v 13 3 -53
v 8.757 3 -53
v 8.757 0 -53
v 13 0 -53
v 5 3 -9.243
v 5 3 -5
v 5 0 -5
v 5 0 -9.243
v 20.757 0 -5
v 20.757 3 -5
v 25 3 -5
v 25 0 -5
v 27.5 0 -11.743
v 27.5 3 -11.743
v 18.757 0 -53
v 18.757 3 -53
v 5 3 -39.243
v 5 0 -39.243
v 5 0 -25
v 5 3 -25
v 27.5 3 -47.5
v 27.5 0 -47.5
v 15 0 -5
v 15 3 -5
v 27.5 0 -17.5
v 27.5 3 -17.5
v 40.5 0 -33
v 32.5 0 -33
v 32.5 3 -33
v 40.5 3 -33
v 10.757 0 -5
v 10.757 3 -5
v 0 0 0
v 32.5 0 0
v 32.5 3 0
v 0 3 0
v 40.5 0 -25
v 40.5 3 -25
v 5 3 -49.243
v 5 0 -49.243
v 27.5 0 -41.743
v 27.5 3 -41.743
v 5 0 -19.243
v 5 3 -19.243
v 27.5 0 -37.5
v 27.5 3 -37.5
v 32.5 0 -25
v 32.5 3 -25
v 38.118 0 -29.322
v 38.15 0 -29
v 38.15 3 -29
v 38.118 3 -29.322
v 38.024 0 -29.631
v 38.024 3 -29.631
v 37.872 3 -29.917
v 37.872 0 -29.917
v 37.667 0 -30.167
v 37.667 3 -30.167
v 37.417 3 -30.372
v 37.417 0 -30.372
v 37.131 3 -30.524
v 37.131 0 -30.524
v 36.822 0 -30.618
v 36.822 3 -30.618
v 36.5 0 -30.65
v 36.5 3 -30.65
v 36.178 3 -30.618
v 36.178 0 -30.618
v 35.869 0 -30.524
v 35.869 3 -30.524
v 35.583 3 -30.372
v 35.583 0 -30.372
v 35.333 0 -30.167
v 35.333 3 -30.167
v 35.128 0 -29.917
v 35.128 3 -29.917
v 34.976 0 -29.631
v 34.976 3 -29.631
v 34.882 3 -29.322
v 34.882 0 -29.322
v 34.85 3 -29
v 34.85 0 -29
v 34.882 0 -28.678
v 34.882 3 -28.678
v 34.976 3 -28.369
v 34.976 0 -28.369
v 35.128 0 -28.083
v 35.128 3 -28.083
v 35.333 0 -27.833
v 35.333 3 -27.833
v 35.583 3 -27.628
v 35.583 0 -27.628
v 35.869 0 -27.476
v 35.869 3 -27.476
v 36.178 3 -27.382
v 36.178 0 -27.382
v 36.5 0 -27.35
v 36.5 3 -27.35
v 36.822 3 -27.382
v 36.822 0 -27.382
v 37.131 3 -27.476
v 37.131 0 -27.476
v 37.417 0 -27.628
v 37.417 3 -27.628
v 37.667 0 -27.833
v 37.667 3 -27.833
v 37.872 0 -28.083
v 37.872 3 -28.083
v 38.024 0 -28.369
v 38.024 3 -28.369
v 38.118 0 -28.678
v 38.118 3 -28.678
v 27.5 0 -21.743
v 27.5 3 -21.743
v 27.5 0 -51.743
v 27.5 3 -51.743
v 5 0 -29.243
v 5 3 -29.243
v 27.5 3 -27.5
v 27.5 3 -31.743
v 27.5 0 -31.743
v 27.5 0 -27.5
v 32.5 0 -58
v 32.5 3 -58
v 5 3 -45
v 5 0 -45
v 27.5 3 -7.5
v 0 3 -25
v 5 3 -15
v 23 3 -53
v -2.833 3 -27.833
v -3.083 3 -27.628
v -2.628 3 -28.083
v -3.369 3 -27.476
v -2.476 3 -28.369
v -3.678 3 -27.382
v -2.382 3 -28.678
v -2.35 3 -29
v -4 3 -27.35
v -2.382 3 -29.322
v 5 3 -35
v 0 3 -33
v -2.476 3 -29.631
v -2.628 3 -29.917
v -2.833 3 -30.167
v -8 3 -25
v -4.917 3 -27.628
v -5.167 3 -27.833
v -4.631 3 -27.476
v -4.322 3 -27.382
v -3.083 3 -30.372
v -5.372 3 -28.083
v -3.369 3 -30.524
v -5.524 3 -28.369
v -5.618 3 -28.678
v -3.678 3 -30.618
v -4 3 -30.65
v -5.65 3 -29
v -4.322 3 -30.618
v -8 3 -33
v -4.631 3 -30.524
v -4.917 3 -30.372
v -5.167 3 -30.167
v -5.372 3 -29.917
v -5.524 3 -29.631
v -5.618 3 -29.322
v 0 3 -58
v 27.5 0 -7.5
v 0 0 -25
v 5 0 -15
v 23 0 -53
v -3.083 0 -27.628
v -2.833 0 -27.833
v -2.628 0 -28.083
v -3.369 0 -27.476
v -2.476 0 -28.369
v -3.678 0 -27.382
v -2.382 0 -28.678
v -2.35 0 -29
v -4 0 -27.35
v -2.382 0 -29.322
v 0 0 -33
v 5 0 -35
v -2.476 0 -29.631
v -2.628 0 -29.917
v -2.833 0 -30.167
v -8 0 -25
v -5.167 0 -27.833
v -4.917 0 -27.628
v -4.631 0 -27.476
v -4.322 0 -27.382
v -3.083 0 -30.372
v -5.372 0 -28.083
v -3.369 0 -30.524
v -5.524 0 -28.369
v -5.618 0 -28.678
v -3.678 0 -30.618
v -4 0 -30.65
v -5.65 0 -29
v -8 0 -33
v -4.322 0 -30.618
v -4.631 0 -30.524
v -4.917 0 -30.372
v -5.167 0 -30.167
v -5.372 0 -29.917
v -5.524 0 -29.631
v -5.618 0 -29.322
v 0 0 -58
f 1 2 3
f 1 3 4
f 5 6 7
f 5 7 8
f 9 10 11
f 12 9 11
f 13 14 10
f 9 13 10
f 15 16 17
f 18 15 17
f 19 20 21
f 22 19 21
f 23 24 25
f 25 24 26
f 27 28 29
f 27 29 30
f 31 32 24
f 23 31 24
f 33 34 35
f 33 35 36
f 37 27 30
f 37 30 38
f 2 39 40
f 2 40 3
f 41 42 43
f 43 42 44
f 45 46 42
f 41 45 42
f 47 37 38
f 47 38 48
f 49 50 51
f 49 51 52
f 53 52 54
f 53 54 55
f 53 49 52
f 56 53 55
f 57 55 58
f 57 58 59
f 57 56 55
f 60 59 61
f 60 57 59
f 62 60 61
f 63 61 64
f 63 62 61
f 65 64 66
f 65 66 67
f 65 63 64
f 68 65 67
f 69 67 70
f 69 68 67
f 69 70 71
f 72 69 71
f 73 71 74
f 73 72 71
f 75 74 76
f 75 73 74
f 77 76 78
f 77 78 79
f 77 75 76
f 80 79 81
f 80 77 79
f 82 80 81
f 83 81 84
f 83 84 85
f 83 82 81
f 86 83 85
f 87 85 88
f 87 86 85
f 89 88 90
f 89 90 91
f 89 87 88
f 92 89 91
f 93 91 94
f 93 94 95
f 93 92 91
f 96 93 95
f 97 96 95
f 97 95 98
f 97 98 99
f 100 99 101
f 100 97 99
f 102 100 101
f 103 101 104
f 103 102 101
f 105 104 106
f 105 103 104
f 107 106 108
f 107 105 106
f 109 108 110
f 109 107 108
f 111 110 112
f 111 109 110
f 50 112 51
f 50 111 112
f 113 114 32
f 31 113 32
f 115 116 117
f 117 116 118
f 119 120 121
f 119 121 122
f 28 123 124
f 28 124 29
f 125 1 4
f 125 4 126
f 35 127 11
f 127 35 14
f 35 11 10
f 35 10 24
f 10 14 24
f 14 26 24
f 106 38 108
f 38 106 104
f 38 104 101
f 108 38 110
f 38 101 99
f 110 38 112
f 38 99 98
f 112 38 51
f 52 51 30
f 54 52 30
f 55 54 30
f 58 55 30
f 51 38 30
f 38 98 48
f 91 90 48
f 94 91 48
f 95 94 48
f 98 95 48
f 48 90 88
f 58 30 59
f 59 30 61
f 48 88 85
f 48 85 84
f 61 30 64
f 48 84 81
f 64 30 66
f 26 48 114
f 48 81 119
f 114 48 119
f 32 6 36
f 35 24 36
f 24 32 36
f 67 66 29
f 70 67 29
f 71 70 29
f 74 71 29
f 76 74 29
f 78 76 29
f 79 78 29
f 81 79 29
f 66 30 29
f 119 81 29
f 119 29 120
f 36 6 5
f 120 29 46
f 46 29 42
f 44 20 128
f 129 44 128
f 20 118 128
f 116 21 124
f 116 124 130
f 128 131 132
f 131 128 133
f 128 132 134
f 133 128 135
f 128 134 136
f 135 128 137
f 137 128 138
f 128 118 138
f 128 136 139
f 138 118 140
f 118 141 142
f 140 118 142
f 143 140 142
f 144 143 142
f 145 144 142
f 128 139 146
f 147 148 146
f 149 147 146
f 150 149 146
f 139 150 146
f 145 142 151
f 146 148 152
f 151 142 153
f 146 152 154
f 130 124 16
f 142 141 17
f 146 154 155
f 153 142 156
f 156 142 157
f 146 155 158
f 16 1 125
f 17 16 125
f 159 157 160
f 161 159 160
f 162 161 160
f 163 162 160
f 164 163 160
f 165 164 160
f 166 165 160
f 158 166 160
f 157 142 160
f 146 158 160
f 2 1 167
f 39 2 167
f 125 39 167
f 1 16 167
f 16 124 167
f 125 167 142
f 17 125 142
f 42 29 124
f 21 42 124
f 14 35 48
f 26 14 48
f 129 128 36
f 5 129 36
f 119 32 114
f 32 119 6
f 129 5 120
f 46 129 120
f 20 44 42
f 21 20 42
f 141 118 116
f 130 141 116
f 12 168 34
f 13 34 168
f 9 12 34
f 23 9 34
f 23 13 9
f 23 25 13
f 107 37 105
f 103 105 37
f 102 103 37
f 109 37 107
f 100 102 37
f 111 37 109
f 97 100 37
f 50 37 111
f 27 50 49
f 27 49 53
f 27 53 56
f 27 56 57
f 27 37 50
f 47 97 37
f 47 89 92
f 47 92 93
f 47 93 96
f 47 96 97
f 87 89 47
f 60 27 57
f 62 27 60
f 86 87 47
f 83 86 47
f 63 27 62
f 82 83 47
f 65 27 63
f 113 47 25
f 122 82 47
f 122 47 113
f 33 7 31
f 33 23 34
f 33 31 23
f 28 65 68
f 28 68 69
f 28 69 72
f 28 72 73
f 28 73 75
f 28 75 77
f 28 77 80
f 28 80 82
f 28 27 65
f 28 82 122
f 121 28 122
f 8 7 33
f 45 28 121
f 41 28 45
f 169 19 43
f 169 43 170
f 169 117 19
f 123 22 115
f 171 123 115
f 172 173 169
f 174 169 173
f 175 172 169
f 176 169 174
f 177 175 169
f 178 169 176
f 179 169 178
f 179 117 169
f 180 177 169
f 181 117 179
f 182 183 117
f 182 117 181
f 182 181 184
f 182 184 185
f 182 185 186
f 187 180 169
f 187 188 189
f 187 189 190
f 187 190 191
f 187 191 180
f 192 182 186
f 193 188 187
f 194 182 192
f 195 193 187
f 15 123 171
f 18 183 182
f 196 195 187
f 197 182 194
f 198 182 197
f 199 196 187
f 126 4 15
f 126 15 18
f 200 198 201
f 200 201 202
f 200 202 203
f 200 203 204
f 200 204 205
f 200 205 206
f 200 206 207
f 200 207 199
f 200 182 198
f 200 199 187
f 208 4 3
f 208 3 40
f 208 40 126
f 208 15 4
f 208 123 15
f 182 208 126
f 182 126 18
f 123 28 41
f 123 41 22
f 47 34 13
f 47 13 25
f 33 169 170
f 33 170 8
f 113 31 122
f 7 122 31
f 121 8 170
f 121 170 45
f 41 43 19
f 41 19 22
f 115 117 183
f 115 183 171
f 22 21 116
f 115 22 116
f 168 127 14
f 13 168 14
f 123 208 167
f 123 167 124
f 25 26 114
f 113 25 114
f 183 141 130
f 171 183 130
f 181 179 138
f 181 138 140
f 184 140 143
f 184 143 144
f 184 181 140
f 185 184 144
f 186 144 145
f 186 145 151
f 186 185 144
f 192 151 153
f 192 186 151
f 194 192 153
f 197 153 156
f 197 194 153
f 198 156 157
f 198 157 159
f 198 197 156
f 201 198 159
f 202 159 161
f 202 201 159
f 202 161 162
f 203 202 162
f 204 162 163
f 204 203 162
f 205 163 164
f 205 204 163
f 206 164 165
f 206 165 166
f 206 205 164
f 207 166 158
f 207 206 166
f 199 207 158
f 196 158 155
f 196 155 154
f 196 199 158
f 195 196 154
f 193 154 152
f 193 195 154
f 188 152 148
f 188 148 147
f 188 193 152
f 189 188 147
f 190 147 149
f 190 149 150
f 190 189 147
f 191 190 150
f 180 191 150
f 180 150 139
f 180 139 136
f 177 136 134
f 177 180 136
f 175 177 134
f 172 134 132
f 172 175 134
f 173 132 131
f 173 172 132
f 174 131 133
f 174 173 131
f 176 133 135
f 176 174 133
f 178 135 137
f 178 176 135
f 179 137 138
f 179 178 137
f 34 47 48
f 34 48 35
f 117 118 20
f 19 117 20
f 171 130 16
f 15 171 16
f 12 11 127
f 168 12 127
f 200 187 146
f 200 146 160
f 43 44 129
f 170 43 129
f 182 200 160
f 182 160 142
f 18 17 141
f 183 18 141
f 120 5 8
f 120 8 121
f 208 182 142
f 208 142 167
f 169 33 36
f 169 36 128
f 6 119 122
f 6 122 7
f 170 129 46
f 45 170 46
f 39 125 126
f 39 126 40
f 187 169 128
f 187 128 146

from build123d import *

# Parameters (mm, degrees)
SKETCH1_R           = 1.65
BOSS_EXTRUDE1_DEPTH = 3
CUT_EXTRUDE1_DEPTH  = 3


with BuildPart() as part:
    # Sketch1 → Boss-Extrude1 (new body)
    with BuildSketch(Plane(origin=(0, 0, 0), x_dir=(1, 0, 0), z_dir=(0, 1, 0))):
        Polygon((0, 25), (-8, 25), (-8, 33), (0, 33), (0, 58), (32.5, 58), (32.5, 33), (40.5, 33), (40.5, 25), (32.5, 25), (32.5, 0), (0, 0), align=None)
        with Locations((-4, 29)):
            Circle(SKETCH1_R, mode=Mode.SUBTRACT)
        with Locations((36.5, 29)):
            Circle(SKETCH1_R, mode=Mode.SUBTRACT)
    extrude(amount=BOSS_EXTRUDE1_DEPTH)

    # Sketch3 → Cut-Extrude1 (cut)
    with BuildSketch(Plane(origin=(0, 3, 0), x_dir=(1, 0, 0), z_dir=(0, 1, 0))):
        Polygon((10.757359313, 5), (15, 5), (27.5, 17.5), (27.5, 21.742640687), align=None)
        Polygon((5, 5), (5, 9.242640687), (27.5, 31.742640687), (27.5, 27.5), align=None)
        Polygon((8.757359313, 53), (13, 53), (5, 45), (5, 49.242640687), align=None)
        Polygon((5, 15), (27.5, 37.5), (27.5, 41.742640687), (5, 19.242640687), align=None)
        Polygon((5, 25), (27.5, 47.5), (27.5, 51.742640687), (5, 29.242640687), align=None)
        Polygon((5, 35), (23, 53), (18.757359313, 53), (5, 39.242640687), align=None)
        Polygon((25, 5), (27.5, 7.5), (27.5, 11.742640687), (20.757359313, 5), align=None)
    extrude(amount=-CUT_EXTRUDE1_DEPTH, mode=Mode.SUBTRACT)


solid = part.part
